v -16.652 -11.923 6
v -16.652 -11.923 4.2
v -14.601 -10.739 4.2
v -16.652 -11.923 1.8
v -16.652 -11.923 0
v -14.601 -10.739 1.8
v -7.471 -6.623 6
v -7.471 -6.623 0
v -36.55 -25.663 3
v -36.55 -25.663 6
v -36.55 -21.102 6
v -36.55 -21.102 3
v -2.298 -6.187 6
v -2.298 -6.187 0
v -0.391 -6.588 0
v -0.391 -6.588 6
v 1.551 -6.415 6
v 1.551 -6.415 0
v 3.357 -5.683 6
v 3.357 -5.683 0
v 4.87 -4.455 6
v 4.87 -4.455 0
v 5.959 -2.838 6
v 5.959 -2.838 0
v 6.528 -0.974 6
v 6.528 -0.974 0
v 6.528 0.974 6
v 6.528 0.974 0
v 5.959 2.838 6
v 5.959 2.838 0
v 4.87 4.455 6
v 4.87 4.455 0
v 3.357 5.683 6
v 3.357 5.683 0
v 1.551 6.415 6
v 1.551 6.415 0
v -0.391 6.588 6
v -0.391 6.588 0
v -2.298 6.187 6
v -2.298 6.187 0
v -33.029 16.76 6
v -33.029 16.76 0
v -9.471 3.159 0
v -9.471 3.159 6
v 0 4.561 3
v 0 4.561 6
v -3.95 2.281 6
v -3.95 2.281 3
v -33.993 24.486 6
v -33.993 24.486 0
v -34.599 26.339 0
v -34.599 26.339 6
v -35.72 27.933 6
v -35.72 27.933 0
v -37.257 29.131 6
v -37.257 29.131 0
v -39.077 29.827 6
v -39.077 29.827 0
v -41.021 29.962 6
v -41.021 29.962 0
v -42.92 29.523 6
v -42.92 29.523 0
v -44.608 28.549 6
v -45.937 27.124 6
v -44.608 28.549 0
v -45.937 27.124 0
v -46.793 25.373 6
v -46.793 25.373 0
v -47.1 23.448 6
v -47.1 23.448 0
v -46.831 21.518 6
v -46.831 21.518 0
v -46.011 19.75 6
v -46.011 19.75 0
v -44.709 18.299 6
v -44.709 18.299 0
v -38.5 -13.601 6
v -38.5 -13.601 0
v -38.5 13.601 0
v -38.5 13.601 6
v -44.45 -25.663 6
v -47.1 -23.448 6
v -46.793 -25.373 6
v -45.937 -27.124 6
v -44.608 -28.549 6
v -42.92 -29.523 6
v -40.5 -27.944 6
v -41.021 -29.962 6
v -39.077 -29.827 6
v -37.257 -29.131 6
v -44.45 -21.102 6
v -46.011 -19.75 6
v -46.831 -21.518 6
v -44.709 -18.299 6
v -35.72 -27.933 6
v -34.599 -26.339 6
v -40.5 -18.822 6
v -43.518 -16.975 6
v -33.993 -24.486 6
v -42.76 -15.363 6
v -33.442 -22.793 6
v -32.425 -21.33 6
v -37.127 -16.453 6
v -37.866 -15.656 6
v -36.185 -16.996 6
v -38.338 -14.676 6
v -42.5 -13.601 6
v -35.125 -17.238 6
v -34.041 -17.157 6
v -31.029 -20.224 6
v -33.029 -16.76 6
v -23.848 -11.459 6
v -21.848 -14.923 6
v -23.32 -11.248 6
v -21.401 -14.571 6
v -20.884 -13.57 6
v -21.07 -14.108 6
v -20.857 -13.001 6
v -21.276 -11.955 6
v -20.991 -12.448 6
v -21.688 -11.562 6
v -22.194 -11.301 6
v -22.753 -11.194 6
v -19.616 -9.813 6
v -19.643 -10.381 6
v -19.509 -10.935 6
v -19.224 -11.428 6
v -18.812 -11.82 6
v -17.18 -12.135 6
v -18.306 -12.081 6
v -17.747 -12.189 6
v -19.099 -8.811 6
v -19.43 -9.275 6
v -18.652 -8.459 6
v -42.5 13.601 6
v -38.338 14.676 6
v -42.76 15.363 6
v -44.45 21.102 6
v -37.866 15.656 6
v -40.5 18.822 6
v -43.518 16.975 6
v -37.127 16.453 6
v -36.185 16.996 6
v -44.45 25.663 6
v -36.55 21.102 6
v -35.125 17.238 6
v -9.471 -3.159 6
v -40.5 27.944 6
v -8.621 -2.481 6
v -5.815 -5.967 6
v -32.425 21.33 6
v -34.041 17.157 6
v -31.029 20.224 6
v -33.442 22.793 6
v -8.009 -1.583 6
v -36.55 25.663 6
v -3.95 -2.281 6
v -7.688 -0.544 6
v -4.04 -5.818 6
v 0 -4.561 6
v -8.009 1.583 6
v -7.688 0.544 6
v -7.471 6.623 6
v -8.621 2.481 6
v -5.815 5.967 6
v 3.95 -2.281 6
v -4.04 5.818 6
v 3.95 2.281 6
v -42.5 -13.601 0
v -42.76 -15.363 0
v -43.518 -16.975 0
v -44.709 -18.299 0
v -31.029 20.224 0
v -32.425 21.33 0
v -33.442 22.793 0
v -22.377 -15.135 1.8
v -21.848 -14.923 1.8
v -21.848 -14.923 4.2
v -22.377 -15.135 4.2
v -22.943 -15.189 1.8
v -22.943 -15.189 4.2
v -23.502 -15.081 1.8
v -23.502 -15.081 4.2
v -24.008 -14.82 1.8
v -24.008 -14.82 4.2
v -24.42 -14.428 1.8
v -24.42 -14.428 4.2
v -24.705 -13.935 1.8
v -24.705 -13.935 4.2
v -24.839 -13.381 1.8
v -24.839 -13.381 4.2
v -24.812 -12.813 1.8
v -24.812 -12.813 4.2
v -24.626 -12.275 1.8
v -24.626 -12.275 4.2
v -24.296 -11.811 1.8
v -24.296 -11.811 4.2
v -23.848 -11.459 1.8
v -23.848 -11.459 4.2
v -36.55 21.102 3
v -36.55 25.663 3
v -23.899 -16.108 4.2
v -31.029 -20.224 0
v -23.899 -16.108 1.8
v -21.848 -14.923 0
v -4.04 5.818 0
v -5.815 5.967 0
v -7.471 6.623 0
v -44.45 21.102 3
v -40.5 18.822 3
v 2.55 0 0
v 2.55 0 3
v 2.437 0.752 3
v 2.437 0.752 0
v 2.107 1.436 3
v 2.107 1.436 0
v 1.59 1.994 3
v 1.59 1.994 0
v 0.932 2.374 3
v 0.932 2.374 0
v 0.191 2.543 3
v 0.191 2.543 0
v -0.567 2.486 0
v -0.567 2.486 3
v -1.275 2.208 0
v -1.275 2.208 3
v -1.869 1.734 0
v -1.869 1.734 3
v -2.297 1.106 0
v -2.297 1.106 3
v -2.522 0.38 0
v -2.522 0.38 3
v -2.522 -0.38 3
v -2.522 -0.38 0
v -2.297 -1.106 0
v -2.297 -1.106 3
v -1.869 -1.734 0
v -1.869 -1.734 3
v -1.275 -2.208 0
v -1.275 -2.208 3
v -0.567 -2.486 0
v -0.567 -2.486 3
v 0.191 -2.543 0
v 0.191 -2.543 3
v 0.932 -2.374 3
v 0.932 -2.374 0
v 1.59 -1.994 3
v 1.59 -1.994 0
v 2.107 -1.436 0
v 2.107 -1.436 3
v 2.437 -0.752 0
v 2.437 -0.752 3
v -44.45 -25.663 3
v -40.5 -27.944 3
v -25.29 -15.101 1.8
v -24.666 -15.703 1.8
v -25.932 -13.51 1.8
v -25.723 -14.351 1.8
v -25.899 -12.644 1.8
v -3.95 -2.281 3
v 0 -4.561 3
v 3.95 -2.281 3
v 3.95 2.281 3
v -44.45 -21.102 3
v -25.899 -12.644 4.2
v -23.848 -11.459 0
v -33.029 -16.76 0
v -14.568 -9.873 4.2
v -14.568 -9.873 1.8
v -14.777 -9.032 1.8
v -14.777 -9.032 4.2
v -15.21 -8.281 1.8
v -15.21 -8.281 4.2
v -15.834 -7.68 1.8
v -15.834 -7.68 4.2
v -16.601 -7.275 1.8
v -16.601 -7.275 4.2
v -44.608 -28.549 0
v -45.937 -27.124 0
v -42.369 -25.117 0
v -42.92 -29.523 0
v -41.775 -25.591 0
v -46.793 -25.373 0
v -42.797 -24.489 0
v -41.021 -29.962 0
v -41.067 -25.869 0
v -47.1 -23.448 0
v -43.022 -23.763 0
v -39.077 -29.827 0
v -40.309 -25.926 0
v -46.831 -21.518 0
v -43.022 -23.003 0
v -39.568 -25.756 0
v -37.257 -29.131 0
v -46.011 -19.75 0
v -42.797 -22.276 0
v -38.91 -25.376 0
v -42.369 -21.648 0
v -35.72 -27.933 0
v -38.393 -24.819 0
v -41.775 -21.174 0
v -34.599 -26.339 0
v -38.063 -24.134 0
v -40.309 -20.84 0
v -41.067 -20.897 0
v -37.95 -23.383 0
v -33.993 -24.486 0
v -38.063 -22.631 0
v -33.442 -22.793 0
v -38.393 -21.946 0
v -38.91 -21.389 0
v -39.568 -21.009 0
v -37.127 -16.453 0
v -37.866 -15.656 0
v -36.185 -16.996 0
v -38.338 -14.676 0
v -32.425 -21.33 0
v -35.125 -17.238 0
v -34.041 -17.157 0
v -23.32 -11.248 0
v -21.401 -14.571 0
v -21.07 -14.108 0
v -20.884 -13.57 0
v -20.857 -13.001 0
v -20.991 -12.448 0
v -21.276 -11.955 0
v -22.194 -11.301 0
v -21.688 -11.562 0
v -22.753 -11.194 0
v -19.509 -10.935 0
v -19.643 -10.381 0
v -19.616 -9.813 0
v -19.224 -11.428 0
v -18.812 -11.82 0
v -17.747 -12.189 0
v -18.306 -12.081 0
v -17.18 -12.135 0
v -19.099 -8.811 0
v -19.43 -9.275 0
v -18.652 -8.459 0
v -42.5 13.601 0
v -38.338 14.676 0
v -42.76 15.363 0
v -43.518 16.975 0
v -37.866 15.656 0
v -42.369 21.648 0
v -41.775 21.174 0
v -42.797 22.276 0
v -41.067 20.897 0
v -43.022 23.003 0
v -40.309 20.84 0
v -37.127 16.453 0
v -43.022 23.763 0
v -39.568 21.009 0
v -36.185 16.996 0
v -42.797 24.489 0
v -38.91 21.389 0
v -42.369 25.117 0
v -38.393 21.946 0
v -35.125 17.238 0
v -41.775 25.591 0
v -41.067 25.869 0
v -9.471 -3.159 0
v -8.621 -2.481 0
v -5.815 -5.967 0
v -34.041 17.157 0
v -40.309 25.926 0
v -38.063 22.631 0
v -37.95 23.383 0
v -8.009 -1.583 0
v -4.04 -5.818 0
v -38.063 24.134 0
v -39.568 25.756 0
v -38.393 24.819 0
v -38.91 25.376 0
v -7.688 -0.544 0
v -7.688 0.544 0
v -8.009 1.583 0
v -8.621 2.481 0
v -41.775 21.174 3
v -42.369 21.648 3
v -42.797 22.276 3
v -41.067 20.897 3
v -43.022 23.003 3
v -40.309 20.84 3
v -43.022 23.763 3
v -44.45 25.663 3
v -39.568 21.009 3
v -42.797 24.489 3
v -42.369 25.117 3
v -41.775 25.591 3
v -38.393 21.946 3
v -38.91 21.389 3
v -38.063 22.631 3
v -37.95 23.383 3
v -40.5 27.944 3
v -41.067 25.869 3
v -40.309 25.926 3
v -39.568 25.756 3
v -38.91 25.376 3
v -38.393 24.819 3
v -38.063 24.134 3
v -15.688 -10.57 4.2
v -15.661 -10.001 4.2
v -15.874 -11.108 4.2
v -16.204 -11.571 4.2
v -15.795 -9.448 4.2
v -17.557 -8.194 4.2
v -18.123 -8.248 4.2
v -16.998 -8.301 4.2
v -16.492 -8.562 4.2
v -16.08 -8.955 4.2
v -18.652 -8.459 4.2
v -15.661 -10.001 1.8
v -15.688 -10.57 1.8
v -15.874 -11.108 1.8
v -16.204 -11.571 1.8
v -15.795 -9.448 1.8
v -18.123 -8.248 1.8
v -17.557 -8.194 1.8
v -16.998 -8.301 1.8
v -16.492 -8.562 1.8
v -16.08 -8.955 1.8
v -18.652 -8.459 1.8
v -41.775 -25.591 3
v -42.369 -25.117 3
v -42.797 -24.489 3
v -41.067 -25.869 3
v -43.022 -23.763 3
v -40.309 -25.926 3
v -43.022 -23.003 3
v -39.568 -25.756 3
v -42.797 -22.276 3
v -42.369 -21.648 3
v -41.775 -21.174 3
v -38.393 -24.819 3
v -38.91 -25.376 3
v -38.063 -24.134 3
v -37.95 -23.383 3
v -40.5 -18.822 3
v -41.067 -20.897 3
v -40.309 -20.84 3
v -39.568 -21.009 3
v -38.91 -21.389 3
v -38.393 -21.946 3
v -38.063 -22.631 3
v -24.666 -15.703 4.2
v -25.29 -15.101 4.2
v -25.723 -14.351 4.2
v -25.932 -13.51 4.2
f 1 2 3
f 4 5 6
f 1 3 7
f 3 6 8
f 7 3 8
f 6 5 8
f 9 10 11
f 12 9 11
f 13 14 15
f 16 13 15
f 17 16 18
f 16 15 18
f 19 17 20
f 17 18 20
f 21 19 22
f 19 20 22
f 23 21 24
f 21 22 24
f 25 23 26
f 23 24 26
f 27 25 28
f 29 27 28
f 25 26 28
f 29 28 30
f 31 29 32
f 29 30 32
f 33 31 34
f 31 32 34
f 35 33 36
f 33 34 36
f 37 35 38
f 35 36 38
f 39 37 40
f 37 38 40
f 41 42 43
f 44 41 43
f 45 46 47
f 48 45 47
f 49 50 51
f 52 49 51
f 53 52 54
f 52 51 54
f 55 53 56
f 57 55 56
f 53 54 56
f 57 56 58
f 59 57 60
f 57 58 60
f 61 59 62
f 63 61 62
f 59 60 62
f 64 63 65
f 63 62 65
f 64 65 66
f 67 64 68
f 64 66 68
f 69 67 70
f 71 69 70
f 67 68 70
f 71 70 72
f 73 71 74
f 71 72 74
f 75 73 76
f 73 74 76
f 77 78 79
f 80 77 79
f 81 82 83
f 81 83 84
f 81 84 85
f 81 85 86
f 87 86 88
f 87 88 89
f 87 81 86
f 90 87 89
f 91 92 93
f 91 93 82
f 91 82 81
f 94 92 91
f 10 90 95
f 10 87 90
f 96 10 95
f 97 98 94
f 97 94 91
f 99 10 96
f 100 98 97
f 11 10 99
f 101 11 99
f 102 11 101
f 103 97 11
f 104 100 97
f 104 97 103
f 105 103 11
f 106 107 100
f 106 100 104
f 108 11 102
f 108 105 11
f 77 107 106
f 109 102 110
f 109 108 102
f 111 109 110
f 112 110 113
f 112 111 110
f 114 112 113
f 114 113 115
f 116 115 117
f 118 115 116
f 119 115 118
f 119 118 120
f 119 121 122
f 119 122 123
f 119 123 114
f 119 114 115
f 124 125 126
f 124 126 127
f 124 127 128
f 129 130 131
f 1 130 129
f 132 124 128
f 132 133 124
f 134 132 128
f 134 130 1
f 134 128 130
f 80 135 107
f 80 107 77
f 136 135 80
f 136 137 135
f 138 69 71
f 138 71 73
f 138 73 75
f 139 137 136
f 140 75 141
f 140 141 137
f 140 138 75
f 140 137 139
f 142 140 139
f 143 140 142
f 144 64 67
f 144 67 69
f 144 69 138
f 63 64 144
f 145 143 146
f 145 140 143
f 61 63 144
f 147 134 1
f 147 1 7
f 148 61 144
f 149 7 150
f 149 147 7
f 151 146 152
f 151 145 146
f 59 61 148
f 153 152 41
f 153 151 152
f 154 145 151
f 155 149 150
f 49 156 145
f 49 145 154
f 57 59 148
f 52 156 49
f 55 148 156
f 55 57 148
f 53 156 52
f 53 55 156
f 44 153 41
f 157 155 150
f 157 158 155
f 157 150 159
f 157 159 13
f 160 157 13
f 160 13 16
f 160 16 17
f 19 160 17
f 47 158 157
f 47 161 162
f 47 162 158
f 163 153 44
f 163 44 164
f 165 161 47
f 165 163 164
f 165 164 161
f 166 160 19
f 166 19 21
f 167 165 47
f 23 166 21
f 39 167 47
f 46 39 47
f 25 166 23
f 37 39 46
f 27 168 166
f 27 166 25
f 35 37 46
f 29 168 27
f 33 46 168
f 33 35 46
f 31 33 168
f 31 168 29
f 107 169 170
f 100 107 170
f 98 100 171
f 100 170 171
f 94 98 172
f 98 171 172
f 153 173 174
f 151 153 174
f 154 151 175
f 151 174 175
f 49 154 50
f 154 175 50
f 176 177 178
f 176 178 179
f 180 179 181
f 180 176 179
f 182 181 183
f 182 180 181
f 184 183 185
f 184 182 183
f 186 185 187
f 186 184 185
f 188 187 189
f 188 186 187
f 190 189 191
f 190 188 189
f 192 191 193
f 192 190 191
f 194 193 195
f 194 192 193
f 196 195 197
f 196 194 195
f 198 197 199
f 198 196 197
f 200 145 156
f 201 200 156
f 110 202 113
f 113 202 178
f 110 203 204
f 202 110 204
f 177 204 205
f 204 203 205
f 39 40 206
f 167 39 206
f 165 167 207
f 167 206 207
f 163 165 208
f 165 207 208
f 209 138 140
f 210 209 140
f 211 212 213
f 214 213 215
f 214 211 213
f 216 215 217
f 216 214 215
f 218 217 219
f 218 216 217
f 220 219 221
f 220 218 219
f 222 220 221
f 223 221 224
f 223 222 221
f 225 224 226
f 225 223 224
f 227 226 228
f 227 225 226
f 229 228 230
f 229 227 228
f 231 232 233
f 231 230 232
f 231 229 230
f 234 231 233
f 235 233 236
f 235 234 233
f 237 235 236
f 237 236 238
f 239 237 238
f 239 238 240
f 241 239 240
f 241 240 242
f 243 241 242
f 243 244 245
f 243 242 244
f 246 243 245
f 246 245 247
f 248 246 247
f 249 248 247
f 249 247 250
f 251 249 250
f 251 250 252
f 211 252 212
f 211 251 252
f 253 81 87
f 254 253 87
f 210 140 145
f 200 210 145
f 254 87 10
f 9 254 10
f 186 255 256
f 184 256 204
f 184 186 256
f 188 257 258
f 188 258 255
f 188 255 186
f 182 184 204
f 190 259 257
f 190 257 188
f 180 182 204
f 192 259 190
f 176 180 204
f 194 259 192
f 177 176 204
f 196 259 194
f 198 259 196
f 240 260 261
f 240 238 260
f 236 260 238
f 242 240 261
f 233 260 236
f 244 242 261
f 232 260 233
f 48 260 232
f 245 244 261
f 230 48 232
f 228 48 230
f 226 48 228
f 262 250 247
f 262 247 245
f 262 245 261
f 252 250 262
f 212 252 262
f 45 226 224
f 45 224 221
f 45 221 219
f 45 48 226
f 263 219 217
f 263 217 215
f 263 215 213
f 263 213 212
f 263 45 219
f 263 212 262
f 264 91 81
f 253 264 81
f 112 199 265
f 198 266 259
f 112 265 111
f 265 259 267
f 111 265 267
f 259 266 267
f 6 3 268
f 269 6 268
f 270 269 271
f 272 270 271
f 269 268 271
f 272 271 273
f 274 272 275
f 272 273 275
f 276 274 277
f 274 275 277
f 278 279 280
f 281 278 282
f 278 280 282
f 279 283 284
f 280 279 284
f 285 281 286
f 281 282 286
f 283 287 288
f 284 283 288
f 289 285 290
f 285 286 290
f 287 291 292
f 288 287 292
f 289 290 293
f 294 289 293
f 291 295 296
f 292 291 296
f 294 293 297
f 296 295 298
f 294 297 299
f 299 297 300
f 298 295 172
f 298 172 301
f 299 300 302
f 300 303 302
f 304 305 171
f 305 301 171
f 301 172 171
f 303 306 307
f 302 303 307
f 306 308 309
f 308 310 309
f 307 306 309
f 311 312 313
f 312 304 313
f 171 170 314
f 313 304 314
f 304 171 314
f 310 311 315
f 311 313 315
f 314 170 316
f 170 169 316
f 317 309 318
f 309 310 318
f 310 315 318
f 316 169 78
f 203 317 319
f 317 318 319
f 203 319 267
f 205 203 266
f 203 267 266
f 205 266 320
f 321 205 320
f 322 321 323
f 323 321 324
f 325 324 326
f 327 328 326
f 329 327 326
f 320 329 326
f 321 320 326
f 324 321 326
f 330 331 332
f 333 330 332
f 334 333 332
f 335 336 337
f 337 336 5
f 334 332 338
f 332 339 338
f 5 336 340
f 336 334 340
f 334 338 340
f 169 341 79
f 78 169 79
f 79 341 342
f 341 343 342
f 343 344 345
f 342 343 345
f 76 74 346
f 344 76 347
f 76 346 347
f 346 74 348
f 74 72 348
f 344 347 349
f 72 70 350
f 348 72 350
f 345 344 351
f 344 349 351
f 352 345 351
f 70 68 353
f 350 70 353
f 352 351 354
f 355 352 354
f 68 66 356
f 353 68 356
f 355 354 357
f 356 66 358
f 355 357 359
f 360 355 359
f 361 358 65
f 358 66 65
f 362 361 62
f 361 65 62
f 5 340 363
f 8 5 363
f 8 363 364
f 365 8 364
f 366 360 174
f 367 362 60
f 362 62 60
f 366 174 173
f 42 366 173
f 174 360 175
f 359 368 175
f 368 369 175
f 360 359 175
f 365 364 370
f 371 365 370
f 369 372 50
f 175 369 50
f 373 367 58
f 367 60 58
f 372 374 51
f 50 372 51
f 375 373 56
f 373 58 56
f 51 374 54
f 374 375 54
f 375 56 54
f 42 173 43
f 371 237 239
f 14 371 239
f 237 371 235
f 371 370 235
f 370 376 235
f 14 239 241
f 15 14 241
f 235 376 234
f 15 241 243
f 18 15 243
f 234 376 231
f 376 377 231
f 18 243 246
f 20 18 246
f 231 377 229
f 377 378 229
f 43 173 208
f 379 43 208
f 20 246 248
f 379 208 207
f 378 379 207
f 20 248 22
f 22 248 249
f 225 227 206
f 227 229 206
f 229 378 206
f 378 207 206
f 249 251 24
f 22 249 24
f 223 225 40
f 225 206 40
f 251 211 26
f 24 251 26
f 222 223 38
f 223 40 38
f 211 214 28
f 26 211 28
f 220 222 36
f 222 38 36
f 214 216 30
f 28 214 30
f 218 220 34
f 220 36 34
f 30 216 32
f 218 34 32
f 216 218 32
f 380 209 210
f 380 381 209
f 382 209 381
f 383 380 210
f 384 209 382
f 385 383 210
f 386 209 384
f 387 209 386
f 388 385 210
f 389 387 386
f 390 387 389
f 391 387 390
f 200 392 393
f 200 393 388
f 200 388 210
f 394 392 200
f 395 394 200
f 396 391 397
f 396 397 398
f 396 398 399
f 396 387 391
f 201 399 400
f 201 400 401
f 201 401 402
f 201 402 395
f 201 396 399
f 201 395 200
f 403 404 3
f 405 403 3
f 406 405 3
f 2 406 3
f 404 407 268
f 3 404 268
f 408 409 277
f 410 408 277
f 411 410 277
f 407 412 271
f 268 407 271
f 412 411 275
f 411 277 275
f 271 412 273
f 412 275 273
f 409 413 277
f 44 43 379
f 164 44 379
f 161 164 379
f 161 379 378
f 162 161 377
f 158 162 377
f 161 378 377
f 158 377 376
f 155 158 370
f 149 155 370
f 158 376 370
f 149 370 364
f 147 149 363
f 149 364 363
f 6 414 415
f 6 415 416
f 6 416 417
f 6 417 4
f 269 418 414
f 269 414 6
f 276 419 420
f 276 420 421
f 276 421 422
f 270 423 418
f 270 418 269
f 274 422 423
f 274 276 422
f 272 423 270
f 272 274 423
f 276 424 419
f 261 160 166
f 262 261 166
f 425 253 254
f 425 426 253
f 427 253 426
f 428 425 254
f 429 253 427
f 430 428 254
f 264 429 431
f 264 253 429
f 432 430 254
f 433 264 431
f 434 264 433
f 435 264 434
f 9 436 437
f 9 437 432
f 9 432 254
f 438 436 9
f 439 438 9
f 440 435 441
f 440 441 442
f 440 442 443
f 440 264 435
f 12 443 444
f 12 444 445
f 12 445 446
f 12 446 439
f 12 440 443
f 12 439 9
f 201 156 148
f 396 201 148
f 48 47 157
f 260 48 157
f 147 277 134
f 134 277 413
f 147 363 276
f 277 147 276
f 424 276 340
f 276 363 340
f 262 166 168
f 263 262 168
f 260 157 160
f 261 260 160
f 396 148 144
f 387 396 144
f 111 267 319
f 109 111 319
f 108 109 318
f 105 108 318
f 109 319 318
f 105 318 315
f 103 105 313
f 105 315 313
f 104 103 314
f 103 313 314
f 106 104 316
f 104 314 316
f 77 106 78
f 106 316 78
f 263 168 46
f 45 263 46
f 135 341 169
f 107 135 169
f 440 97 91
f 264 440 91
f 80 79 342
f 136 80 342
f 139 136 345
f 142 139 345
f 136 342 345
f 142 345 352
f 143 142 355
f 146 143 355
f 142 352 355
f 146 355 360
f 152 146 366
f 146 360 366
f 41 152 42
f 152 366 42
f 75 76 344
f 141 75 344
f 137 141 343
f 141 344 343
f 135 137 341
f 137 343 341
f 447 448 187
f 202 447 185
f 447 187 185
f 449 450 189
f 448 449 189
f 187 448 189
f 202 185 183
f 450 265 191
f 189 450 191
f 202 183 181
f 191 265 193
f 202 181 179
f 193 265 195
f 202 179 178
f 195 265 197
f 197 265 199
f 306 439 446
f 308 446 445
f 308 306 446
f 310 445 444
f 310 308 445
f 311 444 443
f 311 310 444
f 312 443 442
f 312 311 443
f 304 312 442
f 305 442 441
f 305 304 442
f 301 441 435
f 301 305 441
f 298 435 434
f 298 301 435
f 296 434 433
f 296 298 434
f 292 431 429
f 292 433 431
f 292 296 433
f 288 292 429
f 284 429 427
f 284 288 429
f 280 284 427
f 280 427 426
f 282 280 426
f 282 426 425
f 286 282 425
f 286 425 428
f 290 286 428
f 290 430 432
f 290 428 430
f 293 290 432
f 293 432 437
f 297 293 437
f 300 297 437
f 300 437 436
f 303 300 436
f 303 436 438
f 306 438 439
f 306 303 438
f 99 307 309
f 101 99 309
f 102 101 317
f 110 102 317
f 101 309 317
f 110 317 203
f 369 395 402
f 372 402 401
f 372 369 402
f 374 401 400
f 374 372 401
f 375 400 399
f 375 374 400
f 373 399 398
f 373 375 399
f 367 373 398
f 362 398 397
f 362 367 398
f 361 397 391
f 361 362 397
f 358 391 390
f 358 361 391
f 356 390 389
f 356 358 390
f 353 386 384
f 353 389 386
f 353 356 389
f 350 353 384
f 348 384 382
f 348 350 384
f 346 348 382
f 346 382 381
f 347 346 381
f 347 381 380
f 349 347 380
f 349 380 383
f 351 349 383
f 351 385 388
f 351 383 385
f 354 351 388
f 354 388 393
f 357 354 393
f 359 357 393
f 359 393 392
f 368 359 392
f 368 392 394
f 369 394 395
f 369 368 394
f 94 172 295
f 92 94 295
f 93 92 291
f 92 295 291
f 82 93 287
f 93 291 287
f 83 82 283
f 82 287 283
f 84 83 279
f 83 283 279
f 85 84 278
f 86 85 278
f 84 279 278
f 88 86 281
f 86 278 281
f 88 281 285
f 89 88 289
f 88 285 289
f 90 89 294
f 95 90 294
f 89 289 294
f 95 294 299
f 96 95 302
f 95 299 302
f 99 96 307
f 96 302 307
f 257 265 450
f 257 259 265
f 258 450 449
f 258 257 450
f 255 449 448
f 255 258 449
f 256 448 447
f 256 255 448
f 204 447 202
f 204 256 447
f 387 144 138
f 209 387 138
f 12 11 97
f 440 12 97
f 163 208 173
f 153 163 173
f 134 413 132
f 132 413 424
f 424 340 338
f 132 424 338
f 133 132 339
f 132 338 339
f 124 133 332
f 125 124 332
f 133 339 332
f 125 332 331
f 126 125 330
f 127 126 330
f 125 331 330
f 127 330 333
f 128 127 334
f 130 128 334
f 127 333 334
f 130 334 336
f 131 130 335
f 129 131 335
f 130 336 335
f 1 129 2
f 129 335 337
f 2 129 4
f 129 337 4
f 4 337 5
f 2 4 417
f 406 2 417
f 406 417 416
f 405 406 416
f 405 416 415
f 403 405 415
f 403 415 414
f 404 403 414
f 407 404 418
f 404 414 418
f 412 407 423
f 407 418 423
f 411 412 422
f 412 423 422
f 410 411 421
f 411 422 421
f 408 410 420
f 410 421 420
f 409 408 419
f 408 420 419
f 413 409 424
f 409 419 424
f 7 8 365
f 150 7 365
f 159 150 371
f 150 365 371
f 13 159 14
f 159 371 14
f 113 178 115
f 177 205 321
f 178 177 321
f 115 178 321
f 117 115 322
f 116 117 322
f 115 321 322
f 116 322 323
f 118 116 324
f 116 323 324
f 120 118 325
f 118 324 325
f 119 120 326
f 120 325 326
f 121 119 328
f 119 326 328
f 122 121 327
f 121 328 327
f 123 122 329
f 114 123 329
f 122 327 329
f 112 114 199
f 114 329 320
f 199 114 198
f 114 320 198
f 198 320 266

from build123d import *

# Parameters (mm, degrees)
F0_R     = 2.55
F1_DEPTH = 6
F3_DEPTH = 3
F6_DEPTH = 1.2


with BuildPart() as f1:
    # F0 (on Top) → F1 (new body)
    with BuildSketch(Plane.XY):
        with BuildLine():
            ThreePointArc((-31.0288725662, 20.2239290055), (-32.9870436526, 22.0241242247), (-33.9929573966, 24.4864959209))
            ThreePointArc((-33.9929573966, 24.4864959209), (-43.8, 29.0984535672), (-44.7094488189, 18.2993267135))
            ThreePointArc((-44.7094488189, 18.2993267135), (-43.0799292484, 16.196994009), (-42.5, 13.6010704937))
            Line((-42.5, 13.6010704937), (-42.5, -13.6010704937))
            ThreePointArc((-42.5, -13.6010704937), (-43.0799292484, -16.196994009), (-44.7094488189, -18.2993267135))
            ThreePointArc((-44.7094488189, -18.2993267135), (-43.8, -29.0984535672), (-33.9929573966, -24.4864959209))
            ThreePointArc((-33.9929573966, -24.4864959209), (-32.9870429643, -22.0241232349), (-31.0288704781, -20.2239277999))
            Line((-31.0288704781, -20.2239277999), (-21.8480739571, -14.9233924572))
            ThreePointArc((-21.8480739571, -14.9233924572), (-21.1160231495, -12.1913416496), (-23.8480739571, -11.459290842))
            Line((-23.8480739571, -11.459290842), (-33.0288704781, -16.7598261848))
            ThreePointArc((-33.0288704781, -16.7598261848), (-36.6762898114, -16.7598279931), (-38.5, -13.6010704937))
            Line((-38.5, -13.6010704937), (-38.5, 13.6010704937))
            ThreePointArc((-38.5, 13.6010704937), (-36.6762908554, 16.7598273904), (-33.0288725662, 16.7598273904))
            Line((-33.0288725662, 16.7598273904), (-9.4711274338, 3.1587568967))
            ThreePointArc((-9.4711274338, 3.1587568967), (-7.6474182892, 6.361e-07), (-9.471126332, -3.1587562606))
            Line((-9.471126332, -3.1587562606), (-18.6519224918, -8.4592913948))
            ThreePointArc((-18.6519224918, -8.4592913948), (-19.383972999, -11.1913405115), (-16.6519239586, -11.9233913037))
            Line((-16.6519239586, -11.9233913037), (-7.471126332, -6.6228578757))
            ThreePointArc((-7.471126332, -6.6228578757), (-4.9330264651, -5.8271301623), (-2.2975937845, -6.1871692074))
            ThreePointArc((-2.2975937845, -6.1871692074), (6.6, 0), (-2.2975937845, 6.1871692074))
            ThreePointArc((-2.2975937845, 6.1871692074), (-4.933027099, 5.8271302157), (-7.4711274338, 6.6228585118))
            Line((-7.4711274338, 6.6228585118), (-31.0288725662, 20.2239290055))
        make_face()
        with Locations((-40.5, -23.3826859022)):
            Circle(F0_R, mode=Mode.SUBTRACT)
        Circle(F0_R, mode=Mode.SUBTRACT)
        with Locations((-40.5, 23.3826859022)):
            Circle(F0_R, mode=Mode.SUBTRACT)
    extrude(amount=F1_DEPTH)

    # F2 (on face) → F3 (cut)
    with BuildSketch(Plane.XY.offset(6)):
        Polygon((-36.55, 21.1021523389), (-36.55, 25.6632194655), (-40.5, 27.9437530288), (-44.45, 25.6632194655), (-44.45, 21.1021523389), (-40.5, 18.8216187756), align=None)
        Polygon((-36.55, -25.6632194655), (-36.55, -21.1021523389), (-40.5, -18.8216187756), (-44.45, -21.1021523389), (-44.45, -25.6632194655), (-40.5, -27.9437530288), align=None)
        Polygon((-3.95, 2.2805335633), (-3.95, -2.2805335633), (0, -4.5610671266), (3.95, -2.2805335633), (3.95, 2.2805335633), (0, 4.5610671266), align=None)
    extrude(amount=-F3_DEPTH, mode=Mode.SUBTRACT)

    # F5 (on mid) → F6 (cut, symmetric)
    with BuildSketch(Plane.XY.offset(3)):
        with BuildLine():
            Line((-23.8480739571, -11.459290842), (-25.8992931068, -12.6435627702))
            ThreePointArc((-25.8992931068, -12.6435627702), (-25.5327527088, -14.7413416496), (-23.8992931068, -16.1076643854))
            Line((-23.8992931068, -16.1076643854), (-21.8480739571, -14.9233924572))
            ThreePointArc((-21.8480739571, -14.9233924572), (-24.5801247646, -14.1913416496), (-23.8480739571, -11.459290842))
        make_face()
        with BuildLine():
            ThreePointArc((-18.6519224918, -8.4592913948), (-15.9198730901, -9.1913419783), (-16.6519239586, -11.9233913037))
            Line((-16.6519239586, -11.9233913037), (-14.6007037534, -10.7391193365))
            ThreePointArc((-14.6007037534, -10.7391193365), (-14.9672441312, -8.6413415249), (-16.6007025337, -7.2750189998))
            Line((-16.6007025337, -7.2750189998), (-18.6519224918, -8.4592913948))
        make_face()
    extrude(amount=F6_DEPTH, both=True, mode=Mode.SUBTRACT)


solid = f1.part
